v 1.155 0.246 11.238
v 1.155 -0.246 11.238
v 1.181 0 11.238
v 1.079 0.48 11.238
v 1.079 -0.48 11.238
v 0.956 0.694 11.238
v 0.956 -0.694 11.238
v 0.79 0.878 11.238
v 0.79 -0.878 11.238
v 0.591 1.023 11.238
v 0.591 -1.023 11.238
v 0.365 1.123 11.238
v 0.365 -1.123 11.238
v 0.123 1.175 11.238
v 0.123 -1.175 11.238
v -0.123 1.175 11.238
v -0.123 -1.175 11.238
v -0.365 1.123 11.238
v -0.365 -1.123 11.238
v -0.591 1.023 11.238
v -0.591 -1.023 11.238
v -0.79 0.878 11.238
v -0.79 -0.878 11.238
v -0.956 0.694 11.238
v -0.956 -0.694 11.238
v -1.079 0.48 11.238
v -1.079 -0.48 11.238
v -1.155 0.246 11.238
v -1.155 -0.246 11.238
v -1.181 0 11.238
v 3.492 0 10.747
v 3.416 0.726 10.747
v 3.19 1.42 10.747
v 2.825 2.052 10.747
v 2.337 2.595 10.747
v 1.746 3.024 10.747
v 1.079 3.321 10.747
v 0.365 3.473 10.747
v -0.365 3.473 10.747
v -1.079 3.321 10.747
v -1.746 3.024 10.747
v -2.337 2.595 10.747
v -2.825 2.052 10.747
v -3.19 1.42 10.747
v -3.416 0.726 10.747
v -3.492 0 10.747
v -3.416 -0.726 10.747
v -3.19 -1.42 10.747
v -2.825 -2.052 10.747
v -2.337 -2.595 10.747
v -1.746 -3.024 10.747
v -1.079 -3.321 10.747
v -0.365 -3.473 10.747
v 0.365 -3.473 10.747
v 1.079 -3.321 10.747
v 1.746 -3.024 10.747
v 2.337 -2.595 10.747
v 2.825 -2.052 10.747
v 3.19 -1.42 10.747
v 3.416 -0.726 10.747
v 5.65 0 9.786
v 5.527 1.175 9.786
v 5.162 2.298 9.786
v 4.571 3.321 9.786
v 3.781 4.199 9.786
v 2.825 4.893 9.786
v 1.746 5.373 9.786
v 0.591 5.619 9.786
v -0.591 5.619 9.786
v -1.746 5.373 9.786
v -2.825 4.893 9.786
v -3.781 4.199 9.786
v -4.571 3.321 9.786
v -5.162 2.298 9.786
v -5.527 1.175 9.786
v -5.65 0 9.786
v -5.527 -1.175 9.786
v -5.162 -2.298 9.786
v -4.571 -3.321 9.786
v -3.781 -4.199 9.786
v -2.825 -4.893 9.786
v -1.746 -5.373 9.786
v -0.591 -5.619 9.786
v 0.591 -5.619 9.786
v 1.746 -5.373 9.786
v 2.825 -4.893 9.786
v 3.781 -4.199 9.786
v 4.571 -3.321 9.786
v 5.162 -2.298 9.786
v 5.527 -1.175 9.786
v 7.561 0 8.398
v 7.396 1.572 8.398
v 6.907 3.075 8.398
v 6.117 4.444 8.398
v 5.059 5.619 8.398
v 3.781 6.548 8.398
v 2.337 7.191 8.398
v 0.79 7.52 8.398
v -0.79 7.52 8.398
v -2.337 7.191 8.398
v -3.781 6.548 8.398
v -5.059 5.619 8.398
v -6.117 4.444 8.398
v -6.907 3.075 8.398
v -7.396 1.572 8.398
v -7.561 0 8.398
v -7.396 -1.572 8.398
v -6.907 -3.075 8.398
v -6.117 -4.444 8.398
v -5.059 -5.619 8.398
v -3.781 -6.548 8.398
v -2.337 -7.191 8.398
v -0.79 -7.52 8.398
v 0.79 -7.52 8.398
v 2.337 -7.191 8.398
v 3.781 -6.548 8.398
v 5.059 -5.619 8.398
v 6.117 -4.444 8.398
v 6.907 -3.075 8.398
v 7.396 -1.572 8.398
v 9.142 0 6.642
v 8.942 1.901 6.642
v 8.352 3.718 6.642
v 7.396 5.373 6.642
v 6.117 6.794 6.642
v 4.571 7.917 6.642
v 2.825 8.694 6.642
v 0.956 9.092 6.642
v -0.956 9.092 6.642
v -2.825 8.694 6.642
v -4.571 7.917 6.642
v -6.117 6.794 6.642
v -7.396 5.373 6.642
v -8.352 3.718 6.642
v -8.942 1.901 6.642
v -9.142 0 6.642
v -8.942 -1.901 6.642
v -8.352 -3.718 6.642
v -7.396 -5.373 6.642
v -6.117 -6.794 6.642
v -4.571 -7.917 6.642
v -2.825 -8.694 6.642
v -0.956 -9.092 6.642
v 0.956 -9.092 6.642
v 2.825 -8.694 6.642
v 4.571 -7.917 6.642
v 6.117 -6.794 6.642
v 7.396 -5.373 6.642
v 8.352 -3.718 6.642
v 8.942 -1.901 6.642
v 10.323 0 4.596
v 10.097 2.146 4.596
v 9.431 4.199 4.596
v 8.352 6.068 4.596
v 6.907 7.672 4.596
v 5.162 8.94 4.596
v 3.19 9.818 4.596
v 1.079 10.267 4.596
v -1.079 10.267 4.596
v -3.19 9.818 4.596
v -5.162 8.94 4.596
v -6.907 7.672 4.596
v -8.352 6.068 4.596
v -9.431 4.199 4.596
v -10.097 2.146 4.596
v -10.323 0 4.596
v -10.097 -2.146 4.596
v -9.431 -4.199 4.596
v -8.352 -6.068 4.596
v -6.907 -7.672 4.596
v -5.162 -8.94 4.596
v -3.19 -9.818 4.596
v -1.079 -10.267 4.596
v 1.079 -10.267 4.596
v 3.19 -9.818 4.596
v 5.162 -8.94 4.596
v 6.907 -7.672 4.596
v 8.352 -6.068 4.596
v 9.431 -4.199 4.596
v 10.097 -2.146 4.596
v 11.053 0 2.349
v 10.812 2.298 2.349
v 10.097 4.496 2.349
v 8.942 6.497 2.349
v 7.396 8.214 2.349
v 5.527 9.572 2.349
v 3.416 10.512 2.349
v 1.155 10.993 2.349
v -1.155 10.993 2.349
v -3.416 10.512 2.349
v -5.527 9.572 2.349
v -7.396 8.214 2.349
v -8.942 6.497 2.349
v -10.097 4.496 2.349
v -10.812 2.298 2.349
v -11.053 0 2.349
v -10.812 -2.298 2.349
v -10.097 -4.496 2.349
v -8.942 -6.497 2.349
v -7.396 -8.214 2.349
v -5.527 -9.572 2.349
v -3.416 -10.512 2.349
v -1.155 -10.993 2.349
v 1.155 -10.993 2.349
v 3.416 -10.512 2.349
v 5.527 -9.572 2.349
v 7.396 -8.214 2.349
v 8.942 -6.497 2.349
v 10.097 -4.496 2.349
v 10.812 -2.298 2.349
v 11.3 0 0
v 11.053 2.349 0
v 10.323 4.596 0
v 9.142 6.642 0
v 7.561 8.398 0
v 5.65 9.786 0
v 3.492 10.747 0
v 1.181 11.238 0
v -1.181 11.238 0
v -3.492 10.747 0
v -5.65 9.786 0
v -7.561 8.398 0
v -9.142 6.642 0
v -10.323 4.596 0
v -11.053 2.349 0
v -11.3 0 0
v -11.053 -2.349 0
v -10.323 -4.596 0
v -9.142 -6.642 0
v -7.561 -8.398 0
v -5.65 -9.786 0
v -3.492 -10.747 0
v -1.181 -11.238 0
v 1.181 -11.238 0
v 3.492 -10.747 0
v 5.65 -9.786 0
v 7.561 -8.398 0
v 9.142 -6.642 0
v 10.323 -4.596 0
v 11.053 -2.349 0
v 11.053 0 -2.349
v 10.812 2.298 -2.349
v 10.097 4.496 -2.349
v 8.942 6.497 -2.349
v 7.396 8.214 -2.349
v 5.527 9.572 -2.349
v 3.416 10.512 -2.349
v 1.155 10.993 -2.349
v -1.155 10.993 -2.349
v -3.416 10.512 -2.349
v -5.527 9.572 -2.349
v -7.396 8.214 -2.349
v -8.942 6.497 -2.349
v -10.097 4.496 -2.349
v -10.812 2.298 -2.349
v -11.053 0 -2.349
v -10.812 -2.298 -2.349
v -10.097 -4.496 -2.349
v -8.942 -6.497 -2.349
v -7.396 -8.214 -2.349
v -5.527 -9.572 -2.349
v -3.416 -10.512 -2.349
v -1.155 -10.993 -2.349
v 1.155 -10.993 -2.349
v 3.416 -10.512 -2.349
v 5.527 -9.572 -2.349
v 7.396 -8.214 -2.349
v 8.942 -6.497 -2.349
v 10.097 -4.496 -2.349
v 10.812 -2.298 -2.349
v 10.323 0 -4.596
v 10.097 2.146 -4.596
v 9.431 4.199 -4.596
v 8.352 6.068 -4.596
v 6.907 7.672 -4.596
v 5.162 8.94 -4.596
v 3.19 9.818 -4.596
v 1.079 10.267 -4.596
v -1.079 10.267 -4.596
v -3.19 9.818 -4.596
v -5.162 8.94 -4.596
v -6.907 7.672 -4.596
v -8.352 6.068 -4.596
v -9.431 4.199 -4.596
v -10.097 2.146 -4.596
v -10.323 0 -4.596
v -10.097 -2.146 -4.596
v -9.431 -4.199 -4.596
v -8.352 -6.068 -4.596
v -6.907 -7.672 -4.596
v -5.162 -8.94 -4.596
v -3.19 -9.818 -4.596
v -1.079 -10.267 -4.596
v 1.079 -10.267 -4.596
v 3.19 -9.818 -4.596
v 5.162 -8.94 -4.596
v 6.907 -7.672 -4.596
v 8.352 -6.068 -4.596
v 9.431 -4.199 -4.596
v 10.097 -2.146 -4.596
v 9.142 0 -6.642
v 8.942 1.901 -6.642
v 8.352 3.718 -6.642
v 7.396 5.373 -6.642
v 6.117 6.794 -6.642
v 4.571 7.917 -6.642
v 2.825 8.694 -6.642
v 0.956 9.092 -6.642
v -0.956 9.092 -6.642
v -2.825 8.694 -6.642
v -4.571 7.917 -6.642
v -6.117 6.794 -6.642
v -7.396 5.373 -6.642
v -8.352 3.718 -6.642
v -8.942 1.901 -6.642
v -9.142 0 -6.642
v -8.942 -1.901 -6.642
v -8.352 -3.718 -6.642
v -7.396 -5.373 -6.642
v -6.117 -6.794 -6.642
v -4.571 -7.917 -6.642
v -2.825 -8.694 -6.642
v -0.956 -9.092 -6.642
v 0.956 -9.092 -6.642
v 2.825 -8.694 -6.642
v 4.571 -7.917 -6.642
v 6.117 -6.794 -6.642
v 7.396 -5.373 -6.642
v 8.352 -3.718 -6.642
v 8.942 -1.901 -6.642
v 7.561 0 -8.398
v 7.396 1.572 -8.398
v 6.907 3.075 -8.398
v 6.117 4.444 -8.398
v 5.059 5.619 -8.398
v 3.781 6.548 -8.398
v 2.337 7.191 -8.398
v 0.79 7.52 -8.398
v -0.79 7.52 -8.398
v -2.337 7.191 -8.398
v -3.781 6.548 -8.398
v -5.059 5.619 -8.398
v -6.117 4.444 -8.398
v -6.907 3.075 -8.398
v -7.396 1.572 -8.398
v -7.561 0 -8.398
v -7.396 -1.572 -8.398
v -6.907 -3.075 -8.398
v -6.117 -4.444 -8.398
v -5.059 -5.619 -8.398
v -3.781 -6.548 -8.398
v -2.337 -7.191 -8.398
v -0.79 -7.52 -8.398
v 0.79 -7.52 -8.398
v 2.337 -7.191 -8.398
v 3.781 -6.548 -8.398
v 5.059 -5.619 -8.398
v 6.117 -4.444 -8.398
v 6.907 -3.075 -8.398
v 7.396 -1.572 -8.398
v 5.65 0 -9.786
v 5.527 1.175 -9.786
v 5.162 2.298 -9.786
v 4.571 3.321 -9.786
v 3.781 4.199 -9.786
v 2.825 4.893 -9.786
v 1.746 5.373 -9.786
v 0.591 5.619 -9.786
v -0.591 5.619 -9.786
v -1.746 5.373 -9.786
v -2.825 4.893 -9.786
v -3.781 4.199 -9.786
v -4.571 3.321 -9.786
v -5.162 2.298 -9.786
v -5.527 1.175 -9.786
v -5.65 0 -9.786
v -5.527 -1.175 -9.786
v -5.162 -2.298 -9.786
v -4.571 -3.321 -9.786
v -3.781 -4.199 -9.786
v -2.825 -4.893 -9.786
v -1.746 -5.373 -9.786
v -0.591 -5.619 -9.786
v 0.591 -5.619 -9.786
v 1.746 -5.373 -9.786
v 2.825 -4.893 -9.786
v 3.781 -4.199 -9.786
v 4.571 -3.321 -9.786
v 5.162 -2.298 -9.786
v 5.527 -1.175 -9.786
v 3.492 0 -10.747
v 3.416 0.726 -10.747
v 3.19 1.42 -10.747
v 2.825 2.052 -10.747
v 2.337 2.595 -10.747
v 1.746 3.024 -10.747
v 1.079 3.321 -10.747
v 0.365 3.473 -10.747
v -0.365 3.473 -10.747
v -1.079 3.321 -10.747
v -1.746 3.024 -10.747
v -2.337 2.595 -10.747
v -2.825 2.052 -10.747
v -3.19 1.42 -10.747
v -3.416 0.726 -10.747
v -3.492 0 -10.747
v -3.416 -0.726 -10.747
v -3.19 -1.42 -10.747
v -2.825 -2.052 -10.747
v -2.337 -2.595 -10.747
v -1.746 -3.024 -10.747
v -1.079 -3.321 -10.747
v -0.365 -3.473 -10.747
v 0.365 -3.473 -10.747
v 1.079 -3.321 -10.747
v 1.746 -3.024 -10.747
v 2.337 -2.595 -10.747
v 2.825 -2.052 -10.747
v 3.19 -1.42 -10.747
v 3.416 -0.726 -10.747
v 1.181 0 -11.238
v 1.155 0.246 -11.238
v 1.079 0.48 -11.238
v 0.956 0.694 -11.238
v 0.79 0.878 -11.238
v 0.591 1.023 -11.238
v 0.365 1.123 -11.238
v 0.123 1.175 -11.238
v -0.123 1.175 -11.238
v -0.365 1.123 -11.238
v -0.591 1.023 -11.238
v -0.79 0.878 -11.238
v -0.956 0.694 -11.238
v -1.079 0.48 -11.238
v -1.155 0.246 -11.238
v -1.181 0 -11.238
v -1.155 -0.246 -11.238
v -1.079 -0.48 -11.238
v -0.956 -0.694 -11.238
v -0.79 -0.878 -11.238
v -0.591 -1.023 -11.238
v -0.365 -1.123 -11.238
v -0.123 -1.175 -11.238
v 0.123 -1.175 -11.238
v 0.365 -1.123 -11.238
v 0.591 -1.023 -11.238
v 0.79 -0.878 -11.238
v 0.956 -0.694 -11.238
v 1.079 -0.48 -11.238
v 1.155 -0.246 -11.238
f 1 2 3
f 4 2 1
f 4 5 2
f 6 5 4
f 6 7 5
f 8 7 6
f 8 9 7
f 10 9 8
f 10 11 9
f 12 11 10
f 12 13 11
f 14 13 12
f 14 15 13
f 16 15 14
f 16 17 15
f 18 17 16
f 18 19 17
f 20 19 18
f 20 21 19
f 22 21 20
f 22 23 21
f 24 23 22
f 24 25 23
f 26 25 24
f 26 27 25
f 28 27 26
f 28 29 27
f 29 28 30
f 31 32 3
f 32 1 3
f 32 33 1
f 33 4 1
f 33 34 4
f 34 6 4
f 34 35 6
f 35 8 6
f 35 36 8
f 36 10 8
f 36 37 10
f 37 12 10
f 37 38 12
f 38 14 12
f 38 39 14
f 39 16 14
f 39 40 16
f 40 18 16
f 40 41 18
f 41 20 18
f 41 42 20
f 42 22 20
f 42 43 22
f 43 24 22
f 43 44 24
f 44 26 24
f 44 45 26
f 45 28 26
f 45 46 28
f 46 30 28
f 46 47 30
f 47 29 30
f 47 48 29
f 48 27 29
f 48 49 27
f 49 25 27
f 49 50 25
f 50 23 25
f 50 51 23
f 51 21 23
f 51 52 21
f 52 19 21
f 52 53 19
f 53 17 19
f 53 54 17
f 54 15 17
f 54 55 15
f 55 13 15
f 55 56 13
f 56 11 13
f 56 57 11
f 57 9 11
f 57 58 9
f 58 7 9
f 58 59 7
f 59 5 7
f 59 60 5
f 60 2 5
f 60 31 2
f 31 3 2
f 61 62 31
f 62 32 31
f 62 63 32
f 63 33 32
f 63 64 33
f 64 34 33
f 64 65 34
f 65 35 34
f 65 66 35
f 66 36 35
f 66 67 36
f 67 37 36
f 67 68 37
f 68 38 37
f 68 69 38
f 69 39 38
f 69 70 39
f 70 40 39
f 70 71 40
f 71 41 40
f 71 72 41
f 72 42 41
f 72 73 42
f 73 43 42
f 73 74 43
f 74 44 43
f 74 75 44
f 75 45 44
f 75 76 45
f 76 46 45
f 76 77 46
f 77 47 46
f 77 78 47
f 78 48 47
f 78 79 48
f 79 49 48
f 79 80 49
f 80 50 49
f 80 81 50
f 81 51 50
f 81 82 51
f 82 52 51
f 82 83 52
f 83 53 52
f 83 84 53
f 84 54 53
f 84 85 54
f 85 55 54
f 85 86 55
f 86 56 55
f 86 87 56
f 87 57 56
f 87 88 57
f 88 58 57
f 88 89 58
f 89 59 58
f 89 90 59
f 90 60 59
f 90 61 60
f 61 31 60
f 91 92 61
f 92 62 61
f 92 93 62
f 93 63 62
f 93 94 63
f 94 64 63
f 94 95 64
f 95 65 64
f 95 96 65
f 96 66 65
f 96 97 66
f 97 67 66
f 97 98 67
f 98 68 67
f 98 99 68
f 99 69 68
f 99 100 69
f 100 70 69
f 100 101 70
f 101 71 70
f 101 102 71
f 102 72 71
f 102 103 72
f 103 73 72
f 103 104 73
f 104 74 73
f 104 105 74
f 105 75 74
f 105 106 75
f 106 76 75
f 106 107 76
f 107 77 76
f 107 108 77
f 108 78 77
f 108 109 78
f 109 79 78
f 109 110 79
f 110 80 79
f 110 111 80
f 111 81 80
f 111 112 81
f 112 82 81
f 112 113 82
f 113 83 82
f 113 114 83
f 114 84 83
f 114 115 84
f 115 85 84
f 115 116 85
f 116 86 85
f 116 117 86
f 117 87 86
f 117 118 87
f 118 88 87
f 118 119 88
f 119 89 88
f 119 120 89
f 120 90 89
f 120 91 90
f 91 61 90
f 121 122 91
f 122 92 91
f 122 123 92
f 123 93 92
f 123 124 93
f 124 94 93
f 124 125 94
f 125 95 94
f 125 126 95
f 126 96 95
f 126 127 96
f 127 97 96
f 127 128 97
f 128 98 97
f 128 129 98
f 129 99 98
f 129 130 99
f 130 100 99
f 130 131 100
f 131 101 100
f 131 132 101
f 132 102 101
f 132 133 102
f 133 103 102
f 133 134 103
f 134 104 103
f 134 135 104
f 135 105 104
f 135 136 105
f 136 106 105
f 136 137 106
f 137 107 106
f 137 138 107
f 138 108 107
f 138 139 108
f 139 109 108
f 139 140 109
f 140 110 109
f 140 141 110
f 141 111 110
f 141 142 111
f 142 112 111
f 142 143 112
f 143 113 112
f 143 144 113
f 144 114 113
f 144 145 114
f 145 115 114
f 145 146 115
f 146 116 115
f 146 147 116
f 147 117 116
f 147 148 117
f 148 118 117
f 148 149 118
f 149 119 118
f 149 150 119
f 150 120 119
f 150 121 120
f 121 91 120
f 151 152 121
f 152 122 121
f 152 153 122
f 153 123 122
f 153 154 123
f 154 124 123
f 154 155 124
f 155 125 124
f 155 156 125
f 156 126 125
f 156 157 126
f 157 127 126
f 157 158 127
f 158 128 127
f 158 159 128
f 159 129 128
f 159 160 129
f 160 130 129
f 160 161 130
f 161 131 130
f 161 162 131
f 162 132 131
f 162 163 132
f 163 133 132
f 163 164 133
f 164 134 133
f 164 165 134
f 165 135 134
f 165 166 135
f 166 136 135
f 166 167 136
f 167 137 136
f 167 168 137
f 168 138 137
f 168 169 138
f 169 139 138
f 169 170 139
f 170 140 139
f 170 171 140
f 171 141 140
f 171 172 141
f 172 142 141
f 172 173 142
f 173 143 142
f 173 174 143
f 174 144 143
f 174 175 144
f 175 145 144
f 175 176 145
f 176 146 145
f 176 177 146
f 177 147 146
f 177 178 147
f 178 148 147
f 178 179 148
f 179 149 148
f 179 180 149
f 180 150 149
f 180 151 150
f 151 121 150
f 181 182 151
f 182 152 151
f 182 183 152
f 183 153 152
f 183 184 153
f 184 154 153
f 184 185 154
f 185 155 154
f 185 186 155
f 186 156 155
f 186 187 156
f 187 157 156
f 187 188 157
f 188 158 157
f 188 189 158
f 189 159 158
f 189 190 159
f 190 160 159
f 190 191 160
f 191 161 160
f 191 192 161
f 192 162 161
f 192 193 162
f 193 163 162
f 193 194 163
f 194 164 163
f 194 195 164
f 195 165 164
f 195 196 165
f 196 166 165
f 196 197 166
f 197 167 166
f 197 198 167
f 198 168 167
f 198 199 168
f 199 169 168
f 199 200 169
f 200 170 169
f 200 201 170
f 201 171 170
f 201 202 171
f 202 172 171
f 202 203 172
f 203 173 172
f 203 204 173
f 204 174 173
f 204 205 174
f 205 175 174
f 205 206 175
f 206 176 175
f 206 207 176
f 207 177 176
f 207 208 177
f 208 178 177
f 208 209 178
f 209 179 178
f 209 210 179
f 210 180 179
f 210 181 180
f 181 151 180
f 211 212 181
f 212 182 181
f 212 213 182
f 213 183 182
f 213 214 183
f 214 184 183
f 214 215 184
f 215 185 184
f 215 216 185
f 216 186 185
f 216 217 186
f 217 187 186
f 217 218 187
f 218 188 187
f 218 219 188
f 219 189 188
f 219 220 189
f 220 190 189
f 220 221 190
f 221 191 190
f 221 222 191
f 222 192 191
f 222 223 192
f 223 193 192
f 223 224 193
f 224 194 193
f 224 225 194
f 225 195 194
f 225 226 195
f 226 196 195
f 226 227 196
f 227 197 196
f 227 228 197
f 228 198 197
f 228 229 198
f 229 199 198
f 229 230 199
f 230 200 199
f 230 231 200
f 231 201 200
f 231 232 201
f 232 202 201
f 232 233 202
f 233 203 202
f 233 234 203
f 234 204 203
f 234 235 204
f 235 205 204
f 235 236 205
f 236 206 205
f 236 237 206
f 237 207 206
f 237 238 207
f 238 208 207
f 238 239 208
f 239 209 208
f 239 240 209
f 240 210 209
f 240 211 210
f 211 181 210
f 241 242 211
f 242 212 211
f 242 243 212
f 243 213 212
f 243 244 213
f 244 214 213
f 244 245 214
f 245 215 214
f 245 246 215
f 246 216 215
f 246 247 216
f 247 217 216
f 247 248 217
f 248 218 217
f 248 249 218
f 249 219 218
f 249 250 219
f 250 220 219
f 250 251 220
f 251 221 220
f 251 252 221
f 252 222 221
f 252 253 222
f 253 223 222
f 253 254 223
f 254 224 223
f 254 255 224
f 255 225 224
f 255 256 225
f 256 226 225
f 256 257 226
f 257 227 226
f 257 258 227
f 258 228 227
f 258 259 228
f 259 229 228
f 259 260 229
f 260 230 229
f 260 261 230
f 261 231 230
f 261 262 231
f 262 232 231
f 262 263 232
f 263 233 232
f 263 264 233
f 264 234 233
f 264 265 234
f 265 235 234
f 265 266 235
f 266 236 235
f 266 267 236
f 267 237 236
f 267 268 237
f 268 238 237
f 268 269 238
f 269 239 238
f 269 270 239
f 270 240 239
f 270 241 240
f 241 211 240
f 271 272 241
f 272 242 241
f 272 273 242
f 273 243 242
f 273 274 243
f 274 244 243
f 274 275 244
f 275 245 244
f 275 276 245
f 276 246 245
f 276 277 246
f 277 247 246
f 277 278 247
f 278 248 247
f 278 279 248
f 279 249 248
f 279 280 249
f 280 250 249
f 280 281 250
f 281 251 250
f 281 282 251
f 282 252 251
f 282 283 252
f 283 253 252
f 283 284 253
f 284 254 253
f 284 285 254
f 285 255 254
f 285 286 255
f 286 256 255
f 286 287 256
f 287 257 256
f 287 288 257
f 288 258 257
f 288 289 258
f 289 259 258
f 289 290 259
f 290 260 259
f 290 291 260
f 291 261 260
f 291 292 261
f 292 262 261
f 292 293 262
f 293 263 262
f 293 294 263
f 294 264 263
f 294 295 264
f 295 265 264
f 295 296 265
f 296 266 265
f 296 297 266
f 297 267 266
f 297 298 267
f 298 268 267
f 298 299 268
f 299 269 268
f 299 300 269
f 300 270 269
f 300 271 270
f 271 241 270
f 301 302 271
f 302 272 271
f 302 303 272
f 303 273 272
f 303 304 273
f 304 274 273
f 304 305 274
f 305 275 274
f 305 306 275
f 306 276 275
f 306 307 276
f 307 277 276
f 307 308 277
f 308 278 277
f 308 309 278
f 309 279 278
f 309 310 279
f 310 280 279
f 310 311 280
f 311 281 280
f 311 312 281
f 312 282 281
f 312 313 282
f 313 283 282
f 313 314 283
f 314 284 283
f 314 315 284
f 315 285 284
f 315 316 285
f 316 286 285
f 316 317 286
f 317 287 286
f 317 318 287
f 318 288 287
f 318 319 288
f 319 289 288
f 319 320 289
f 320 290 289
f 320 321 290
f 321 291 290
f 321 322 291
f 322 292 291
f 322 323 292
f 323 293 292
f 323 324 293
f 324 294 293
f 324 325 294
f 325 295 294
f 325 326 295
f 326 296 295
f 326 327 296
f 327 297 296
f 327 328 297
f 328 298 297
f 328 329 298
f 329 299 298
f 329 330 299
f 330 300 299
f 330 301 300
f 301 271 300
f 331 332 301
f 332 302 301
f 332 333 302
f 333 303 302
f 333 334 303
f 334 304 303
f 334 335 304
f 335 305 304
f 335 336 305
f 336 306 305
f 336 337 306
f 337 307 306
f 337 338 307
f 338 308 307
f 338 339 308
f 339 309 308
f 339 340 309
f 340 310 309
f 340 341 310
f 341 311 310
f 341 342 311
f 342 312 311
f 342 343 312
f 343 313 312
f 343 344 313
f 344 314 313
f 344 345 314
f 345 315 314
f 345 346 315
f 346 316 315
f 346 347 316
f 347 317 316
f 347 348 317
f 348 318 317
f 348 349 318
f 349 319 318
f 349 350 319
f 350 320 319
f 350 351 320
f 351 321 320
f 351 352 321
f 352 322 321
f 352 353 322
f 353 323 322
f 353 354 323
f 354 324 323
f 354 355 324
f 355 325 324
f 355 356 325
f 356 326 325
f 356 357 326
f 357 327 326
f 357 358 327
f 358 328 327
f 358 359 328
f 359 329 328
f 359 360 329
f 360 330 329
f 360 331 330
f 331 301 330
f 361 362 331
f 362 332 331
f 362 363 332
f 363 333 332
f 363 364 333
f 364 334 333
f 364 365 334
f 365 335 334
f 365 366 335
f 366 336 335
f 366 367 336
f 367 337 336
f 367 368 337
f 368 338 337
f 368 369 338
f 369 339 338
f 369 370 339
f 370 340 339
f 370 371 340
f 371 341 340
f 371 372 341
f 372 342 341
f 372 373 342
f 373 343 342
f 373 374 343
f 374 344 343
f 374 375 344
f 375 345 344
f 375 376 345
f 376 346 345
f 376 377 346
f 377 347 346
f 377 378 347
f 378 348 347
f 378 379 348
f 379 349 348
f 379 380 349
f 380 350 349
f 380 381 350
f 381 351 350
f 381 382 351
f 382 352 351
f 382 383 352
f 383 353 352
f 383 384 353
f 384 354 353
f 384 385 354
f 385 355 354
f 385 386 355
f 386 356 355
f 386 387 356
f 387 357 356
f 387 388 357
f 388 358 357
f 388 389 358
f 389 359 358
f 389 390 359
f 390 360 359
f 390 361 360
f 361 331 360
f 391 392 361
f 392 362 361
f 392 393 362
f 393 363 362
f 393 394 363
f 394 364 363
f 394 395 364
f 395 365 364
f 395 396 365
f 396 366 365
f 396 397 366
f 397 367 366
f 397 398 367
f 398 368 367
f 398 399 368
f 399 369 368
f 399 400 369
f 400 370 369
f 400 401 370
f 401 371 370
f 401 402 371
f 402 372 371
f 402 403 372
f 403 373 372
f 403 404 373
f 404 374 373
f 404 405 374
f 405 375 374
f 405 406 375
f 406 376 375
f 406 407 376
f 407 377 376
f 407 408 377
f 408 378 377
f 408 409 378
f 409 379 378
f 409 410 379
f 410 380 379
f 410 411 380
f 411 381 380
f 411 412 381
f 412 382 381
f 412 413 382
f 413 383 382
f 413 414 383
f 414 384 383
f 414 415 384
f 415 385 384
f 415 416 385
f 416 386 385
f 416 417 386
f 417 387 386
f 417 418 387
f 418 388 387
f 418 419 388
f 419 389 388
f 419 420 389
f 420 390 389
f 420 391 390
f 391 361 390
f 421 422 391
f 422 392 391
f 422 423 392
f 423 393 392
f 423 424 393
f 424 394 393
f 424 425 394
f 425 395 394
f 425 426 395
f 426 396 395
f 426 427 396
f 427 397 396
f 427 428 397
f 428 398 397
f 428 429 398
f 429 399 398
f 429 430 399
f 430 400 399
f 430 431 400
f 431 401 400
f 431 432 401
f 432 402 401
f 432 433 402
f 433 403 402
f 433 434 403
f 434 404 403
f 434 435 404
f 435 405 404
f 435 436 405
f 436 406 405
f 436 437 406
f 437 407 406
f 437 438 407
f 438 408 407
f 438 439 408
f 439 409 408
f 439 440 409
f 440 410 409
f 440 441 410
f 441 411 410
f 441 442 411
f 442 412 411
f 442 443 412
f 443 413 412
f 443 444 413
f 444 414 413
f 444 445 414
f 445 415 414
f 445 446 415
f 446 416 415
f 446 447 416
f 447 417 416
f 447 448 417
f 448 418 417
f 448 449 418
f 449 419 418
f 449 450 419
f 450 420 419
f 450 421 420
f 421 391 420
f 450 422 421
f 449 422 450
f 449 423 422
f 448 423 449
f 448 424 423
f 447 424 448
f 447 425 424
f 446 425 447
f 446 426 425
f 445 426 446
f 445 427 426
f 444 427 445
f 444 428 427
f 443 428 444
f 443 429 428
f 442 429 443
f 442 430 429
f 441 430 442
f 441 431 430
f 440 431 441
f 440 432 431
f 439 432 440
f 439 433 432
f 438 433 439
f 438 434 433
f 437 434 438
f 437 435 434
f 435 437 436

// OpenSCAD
// curved primitive, segment count from $fa/$fs
sphere(r = 11.3);
